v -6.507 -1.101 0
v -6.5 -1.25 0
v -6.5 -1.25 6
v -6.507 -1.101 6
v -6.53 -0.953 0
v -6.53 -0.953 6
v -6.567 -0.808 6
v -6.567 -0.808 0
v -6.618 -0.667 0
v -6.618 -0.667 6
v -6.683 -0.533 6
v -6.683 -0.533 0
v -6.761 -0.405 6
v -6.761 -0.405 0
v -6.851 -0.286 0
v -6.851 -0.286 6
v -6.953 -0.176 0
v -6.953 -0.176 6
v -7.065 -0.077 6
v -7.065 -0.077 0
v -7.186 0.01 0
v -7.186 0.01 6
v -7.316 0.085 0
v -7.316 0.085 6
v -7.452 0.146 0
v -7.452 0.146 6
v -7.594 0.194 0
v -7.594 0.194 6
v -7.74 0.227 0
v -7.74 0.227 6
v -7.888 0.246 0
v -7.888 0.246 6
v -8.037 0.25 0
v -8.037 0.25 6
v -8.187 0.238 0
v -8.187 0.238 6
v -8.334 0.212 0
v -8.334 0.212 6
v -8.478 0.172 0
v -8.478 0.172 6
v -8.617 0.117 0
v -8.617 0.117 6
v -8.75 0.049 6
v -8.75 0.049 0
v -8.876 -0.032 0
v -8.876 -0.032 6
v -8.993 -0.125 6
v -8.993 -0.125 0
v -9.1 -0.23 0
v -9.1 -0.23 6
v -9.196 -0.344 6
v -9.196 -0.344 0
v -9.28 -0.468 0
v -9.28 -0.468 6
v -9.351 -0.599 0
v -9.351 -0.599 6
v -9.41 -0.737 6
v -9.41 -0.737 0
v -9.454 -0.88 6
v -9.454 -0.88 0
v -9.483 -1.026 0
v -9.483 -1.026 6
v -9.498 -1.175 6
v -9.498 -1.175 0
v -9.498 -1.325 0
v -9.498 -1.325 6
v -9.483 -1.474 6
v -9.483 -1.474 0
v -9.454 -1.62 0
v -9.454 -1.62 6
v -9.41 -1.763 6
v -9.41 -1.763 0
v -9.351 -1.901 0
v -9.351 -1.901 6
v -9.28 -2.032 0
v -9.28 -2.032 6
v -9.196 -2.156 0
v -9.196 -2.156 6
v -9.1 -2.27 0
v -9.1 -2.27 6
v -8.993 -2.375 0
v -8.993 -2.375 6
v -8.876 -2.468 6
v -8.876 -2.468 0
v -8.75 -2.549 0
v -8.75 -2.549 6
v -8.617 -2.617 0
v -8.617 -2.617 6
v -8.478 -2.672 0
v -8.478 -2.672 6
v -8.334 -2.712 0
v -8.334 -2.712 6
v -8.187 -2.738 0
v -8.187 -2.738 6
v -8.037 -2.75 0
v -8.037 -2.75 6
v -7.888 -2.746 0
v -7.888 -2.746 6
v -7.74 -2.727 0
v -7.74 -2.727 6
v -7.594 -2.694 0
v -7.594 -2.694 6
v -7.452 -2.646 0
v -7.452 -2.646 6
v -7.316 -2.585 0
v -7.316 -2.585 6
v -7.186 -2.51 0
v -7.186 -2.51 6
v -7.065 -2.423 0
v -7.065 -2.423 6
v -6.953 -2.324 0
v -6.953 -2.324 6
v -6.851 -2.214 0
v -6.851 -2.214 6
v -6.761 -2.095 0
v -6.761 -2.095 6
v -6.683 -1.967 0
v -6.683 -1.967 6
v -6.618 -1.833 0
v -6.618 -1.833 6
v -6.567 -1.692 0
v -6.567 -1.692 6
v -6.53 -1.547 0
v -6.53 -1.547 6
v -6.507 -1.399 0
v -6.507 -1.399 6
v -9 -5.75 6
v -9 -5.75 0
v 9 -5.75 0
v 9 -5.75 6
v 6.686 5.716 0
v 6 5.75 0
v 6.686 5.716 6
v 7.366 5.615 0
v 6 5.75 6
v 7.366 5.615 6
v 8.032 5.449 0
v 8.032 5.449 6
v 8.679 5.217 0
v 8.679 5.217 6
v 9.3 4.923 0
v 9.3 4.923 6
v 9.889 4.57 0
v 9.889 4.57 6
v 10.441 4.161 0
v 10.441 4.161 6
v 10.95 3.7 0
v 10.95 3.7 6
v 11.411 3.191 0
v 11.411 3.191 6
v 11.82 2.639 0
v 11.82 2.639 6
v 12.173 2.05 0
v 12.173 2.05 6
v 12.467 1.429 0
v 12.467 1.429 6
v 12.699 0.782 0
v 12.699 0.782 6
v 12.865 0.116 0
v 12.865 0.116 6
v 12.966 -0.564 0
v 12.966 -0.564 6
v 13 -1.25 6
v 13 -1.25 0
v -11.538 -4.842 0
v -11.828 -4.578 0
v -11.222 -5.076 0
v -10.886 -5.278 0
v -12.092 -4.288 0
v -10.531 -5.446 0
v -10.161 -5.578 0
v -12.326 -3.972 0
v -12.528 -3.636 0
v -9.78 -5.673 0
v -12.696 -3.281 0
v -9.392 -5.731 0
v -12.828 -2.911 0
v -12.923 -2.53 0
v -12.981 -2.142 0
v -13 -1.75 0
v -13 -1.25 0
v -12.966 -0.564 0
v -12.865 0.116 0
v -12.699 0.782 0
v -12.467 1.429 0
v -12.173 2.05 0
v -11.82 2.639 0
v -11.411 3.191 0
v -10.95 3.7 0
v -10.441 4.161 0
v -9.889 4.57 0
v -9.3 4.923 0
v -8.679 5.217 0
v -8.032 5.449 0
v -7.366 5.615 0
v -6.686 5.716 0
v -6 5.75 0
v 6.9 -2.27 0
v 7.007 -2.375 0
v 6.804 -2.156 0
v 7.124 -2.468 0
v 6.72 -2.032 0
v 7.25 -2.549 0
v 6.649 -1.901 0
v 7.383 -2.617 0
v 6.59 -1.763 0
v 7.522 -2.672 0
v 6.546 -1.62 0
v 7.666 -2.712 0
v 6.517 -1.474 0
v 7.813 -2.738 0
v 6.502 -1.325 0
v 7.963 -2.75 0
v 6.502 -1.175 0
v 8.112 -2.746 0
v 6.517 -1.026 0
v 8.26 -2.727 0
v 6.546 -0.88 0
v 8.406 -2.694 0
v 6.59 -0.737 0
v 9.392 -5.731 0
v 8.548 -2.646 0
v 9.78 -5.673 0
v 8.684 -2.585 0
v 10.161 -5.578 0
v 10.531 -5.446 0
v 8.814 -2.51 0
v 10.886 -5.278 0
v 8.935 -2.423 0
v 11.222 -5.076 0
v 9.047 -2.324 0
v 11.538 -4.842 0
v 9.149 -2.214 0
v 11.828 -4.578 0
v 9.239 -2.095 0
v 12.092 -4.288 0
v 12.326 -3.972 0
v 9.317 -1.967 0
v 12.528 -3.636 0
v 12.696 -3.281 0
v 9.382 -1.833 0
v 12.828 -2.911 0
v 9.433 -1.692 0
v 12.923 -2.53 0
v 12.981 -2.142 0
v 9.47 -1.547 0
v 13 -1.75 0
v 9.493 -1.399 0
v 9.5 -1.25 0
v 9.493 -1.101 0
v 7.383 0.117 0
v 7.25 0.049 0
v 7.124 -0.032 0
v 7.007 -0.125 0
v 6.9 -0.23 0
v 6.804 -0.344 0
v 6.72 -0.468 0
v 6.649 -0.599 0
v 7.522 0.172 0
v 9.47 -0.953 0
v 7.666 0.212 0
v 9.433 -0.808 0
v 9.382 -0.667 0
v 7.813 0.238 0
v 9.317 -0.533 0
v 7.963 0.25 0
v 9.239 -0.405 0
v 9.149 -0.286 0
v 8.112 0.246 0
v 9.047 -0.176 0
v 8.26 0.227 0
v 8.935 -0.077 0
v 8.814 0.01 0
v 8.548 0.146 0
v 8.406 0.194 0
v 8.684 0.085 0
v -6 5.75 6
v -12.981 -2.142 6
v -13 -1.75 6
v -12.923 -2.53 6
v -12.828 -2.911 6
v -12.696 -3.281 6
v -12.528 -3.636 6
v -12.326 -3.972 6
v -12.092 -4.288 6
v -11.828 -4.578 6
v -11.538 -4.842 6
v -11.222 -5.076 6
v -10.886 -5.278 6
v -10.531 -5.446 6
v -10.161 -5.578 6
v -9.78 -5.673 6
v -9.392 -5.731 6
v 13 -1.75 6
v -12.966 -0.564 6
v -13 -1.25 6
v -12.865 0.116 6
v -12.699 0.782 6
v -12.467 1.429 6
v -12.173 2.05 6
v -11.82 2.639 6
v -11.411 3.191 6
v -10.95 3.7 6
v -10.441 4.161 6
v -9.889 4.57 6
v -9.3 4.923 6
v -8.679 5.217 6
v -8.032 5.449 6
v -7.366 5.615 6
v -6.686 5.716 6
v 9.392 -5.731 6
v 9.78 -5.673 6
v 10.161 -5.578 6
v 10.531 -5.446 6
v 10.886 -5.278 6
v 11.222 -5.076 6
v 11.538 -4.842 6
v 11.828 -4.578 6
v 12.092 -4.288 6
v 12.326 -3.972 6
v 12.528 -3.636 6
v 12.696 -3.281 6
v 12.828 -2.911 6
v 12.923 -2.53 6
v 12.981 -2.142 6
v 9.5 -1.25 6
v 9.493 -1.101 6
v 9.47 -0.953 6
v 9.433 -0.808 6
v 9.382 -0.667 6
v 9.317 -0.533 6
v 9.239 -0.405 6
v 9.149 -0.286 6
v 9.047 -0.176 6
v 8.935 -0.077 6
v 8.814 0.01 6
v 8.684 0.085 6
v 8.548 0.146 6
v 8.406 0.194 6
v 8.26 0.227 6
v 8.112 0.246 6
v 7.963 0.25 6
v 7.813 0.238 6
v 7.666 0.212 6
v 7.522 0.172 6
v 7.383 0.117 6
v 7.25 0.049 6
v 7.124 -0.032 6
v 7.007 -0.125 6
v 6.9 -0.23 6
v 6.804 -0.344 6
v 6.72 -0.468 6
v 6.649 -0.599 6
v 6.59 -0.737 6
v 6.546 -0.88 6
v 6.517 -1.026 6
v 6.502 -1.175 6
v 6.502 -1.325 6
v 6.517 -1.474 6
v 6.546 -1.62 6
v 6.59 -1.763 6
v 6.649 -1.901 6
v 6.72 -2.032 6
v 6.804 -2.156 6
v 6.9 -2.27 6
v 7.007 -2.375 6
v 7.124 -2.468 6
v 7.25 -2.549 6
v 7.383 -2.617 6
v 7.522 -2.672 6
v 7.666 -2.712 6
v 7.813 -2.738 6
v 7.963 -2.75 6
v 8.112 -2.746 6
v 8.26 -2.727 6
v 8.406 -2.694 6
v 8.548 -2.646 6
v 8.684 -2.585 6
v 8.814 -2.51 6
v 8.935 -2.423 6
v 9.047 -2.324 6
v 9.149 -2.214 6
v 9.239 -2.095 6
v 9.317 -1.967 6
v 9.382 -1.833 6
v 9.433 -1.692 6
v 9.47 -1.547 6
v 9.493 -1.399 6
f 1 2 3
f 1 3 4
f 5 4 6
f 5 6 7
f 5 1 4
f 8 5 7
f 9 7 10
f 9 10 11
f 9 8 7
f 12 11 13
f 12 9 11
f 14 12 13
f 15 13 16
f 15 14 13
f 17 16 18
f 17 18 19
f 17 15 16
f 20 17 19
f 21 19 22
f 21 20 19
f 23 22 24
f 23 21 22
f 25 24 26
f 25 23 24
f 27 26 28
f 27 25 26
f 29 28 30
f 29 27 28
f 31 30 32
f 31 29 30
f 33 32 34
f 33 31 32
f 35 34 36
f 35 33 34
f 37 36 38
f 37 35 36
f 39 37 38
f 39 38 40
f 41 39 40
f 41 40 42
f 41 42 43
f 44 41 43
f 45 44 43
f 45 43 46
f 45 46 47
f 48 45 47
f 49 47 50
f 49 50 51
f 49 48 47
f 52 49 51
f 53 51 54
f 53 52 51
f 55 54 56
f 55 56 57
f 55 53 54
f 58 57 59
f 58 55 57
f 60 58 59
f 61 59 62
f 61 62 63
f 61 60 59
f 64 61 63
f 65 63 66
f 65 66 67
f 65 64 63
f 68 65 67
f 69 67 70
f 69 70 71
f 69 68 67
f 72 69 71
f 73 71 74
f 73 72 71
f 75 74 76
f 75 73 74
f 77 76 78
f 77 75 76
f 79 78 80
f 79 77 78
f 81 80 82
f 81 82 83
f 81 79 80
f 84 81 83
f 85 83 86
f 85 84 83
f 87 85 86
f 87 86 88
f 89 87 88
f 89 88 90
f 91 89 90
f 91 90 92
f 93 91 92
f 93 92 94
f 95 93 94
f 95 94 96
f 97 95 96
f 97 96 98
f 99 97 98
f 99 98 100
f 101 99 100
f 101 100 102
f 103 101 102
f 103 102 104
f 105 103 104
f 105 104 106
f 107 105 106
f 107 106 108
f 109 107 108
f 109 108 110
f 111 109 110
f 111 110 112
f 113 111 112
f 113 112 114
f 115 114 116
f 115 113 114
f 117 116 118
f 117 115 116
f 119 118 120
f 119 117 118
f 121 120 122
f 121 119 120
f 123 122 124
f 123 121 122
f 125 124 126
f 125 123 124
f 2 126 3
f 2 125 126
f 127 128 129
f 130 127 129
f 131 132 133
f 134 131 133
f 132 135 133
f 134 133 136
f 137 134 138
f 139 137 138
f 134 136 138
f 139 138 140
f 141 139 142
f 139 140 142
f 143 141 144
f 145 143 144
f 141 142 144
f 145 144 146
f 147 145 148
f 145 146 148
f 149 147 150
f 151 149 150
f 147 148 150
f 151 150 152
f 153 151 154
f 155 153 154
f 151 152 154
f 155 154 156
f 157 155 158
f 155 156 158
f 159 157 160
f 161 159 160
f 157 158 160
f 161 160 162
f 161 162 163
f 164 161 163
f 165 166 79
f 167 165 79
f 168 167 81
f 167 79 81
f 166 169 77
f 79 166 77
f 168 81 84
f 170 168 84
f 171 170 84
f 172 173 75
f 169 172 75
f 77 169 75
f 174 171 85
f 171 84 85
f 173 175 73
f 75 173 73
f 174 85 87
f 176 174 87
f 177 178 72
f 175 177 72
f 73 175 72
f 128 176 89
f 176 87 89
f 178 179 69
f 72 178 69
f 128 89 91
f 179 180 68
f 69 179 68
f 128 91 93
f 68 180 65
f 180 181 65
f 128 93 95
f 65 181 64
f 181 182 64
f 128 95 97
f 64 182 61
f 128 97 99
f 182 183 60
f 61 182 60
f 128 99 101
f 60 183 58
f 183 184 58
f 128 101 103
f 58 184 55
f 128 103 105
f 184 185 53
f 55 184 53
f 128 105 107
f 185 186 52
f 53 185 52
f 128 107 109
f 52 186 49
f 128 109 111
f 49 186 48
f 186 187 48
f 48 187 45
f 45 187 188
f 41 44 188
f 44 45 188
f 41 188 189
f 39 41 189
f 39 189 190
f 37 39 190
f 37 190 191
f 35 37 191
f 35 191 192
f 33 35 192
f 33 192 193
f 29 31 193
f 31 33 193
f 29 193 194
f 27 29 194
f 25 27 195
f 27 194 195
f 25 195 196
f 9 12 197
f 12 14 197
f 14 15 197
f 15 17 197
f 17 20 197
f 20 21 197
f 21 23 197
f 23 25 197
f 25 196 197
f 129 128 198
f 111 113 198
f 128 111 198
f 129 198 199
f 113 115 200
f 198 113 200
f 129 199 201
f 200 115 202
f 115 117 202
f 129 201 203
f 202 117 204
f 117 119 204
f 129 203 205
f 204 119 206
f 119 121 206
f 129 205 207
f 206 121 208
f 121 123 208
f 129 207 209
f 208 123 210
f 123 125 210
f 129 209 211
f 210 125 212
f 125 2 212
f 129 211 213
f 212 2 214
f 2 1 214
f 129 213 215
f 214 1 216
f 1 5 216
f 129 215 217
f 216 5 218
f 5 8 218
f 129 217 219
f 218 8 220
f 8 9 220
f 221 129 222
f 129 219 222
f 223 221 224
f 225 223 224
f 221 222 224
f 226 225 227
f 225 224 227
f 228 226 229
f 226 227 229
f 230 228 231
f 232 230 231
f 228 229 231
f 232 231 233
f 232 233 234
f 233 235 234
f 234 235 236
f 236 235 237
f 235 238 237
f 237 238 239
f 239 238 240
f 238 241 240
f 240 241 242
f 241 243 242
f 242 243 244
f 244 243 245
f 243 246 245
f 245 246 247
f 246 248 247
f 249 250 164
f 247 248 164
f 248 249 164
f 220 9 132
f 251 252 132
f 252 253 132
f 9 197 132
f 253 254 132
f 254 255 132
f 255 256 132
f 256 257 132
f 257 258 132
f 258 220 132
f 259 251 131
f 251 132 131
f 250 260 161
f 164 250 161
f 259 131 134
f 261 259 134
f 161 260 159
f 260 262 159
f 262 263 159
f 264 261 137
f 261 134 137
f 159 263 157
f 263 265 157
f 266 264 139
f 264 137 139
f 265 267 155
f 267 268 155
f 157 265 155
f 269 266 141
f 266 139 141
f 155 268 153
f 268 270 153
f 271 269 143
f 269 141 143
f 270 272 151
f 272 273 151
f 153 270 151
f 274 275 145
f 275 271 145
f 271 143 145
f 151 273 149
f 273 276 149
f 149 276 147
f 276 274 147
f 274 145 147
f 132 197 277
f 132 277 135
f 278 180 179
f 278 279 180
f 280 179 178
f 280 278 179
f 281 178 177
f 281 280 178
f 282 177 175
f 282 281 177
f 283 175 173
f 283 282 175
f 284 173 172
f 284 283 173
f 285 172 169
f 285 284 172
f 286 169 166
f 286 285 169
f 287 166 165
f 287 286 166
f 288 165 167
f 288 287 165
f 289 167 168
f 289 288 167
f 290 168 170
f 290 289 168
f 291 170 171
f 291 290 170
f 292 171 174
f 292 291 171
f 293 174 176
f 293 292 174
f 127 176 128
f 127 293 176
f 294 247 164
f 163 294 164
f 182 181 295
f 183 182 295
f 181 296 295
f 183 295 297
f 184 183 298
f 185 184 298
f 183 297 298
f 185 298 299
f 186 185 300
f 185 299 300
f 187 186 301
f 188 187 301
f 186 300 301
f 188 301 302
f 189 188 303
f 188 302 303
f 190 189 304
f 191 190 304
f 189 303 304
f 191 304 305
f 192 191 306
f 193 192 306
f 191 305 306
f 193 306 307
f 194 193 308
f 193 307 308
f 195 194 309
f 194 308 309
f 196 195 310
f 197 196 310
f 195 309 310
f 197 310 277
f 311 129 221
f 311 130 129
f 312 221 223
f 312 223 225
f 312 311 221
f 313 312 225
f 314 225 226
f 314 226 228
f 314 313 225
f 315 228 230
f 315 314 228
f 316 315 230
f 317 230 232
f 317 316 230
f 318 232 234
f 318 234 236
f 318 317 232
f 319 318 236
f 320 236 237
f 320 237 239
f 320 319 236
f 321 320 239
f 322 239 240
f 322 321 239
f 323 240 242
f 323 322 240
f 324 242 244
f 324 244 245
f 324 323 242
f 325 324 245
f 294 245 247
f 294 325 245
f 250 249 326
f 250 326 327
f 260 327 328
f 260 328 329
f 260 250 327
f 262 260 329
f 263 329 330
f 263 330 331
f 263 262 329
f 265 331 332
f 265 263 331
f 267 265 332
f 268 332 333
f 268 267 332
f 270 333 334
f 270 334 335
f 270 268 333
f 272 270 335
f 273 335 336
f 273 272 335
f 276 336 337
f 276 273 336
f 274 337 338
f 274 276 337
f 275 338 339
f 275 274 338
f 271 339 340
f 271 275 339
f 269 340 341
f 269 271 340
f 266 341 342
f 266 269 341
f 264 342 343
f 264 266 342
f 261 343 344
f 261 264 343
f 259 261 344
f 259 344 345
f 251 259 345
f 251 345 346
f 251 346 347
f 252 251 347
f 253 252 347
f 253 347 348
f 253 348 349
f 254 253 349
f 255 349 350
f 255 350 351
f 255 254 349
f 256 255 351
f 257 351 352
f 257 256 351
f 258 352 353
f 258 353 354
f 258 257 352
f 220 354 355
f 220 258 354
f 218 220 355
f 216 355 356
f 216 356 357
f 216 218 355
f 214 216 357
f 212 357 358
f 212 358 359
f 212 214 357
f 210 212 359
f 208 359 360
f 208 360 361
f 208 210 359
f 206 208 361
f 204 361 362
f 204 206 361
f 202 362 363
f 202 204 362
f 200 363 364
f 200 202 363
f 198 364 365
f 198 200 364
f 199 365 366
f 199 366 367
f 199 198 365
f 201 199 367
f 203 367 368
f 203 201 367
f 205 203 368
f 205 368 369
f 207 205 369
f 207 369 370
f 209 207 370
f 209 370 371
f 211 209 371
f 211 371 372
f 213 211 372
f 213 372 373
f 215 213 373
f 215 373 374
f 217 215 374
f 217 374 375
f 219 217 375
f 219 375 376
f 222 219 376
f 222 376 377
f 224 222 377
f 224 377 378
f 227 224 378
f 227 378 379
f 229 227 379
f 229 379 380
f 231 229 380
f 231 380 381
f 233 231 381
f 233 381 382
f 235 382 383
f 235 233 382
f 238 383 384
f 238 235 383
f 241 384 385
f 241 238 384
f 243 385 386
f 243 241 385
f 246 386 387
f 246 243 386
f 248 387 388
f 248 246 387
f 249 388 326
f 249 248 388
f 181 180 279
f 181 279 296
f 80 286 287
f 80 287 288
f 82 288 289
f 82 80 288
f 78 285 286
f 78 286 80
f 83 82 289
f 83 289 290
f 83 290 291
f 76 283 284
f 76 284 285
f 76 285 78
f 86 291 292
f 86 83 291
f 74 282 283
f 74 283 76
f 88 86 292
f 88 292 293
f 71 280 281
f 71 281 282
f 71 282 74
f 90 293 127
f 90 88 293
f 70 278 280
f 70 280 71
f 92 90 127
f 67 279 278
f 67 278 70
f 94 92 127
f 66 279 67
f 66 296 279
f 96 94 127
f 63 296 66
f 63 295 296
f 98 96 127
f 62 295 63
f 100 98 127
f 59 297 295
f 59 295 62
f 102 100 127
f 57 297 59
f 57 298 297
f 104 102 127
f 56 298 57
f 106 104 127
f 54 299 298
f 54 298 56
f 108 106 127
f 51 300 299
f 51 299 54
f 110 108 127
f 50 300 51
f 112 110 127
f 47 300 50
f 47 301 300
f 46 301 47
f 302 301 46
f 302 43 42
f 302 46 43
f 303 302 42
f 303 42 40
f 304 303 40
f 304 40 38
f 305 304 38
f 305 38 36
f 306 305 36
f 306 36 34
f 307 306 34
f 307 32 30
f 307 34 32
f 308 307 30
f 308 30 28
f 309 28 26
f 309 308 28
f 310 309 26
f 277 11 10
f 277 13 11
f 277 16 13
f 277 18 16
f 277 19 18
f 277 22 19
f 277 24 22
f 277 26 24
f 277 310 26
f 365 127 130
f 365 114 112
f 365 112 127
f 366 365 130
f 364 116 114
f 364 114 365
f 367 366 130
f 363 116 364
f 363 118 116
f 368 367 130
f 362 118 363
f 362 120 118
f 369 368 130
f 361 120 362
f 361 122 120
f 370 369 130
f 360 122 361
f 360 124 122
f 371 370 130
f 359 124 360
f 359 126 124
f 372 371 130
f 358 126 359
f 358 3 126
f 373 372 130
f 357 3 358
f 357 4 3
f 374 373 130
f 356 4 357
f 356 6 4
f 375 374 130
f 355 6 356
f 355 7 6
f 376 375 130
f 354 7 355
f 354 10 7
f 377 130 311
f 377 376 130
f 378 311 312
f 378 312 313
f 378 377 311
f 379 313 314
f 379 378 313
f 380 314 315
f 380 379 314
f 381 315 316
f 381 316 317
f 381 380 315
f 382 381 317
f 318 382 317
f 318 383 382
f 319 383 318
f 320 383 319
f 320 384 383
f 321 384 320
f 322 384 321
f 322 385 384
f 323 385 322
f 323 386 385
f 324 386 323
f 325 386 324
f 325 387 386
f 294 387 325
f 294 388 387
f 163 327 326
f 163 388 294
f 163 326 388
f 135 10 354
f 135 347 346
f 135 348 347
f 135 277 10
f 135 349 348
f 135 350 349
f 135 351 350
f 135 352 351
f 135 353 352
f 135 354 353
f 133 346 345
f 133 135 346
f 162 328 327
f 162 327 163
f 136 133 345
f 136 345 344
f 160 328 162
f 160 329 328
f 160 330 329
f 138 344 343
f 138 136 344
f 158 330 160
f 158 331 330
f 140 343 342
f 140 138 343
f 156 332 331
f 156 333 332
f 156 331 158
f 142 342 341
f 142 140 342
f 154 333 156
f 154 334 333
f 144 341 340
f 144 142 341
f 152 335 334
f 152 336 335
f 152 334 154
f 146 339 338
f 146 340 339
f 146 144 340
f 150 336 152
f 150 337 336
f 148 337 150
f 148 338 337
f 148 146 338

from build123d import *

# Parameters (mm, degrees)
ESBO_O1_W                = 26
ESBO_O1_H                = 11.5
ESBO_O1_R                = 1.5
RESSALTO_EXTRUS_O1_DEPTH = 6
FILETE1_R                = 7
FILETE2_R                = 4


with BuildPart() as part:
    # Esboço1 → Ressalto-extrusão1 (new body)
    with BuildSketch(Plane.XY):
        Rectangle(ESBO_O1_W, ESBO_O1_H)
        with Locations((-8, -1.25)):
            Circle(ESBO_O1_R, mode=Mode.SUBTRACT)
        with Locations((8, -1.25)):
            Circle(ESBO_O1_R, mode=Mode.SUBTRACT)
    extrude(amount=RESSALTO_EXTRUS_O1_DEPTH)

    # Filete1
    filete1_edges = [part.edges().sort_by_distance(p)[0] for p in [
        (-13, 5.75, 3),
        (13, 5.75, 3),
    ]]
    fillet(filete1_edges, radius=FILETE1_R)

    # Filete2
    filete2_edges = [part.edges().sort_by_distance(p)[0] for p in [
        (-13, -5.75, 3),
        (13, -5.75, 3),
    ]]
    fillet(filete2_edges, radius=FILETE2_R)


solid = part.part
